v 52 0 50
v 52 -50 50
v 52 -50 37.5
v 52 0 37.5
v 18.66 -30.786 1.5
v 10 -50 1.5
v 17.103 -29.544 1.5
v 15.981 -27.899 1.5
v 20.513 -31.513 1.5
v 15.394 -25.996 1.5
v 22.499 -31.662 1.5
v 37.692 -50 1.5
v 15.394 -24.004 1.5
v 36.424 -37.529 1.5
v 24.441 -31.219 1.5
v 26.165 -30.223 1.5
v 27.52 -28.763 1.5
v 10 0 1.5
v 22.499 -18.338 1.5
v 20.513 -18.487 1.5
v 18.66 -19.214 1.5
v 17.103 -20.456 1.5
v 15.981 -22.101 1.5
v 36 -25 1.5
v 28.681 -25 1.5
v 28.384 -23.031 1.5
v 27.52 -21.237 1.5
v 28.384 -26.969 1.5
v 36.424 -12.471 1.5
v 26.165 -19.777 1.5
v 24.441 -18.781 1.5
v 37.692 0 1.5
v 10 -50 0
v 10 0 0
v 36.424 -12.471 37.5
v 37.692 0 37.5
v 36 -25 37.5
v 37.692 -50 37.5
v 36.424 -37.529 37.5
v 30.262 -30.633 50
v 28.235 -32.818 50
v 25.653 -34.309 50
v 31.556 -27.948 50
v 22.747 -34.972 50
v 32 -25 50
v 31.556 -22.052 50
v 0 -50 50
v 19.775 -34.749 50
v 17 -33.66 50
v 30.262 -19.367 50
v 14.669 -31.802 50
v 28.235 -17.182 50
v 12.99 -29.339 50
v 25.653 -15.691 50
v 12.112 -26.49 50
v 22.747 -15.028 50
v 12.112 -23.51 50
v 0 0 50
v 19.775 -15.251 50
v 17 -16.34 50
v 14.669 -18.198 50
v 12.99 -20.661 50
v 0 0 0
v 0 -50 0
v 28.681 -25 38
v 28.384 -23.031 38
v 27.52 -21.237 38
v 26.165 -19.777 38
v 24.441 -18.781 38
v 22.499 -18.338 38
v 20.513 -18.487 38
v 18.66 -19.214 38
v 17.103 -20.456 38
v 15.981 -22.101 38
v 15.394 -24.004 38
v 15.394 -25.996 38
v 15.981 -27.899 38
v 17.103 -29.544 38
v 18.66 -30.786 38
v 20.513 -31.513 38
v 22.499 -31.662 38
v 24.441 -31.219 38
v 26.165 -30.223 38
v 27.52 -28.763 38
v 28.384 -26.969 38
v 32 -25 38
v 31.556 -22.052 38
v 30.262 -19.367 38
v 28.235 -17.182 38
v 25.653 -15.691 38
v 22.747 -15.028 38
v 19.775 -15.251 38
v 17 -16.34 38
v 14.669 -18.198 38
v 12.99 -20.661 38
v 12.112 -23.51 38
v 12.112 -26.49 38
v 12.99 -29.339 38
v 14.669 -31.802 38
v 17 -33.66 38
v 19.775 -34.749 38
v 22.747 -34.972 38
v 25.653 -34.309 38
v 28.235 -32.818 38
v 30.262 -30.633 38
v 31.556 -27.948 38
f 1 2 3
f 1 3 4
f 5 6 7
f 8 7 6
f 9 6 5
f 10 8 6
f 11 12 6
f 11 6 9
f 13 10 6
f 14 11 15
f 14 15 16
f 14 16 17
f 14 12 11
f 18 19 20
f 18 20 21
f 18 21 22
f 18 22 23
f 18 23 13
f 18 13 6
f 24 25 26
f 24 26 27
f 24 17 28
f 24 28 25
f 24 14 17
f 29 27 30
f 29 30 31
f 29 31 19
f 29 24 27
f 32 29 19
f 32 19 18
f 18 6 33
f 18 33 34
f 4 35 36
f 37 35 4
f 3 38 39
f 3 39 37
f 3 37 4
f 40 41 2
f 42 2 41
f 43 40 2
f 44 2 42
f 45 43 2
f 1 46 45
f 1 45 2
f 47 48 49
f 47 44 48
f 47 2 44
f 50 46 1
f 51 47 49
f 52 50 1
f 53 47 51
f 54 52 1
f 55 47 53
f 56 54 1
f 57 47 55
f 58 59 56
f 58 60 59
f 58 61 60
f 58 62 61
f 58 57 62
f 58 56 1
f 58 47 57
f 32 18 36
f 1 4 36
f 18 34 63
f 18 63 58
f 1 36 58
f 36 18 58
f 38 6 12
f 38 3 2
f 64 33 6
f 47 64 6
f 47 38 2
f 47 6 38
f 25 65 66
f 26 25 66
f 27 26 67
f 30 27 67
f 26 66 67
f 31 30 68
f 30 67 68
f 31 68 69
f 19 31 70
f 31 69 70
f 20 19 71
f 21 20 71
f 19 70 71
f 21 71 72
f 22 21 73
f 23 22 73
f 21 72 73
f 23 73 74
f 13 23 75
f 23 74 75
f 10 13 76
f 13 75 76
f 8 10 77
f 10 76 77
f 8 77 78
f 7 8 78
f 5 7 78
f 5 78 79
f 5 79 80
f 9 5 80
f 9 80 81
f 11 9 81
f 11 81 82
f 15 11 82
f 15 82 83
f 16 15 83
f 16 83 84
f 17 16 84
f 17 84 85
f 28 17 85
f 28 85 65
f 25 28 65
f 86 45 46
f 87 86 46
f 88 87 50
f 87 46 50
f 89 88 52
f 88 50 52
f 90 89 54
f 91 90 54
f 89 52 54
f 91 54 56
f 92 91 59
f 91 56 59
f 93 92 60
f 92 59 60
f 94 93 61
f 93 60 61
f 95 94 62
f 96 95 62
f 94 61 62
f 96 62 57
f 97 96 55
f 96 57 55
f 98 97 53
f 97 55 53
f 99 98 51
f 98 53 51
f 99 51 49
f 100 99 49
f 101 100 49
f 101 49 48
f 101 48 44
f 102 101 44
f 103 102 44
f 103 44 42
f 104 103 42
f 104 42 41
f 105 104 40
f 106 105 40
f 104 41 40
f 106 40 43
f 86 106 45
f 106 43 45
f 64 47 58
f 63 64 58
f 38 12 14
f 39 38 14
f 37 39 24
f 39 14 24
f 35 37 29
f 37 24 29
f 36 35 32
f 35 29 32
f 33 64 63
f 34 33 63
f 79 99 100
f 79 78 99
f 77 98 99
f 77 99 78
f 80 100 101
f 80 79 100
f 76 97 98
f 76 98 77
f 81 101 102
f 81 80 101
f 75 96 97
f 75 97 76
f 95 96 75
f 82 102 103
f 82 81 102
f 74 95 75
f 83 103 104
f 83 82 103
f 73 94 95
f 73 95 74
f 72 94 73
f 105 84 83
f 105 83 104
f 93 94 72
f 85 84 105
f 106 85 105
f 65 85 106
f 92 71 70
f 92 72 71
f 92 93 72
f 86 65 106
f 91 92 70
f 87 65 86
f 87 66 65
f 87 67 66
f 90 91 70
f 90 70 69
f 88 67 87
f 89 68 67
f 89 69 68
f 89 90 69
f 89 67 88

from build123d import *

# Parameters (mm, degrees)
F0_W     = 50
F0_H     = 50
F1_DEPTH = 52
F2_W     = 50
F2_H     = 1.5
F3_DEPTH = 42
F5_DEPTH = 36
F6_R     = 6.680851
F7_DEPTH = 65.6
F8_R     = 10
F9_DEPTH = 12


with BuildPart() as f1:
    # F0 (on Right) → F1 (new body)
    with BuildSketch(Plane.YZ):
        with Locations((-25, 25)):
            Rectangle(F0_W, F0_H)
    extrude(amount=F1_DEPTH)

    # F2 (on face) → F3 (cut)
    with BuildSketch(Plane.YZ.offset(52)):
        with Locations((-25, 0.75)):
            Rectangle(F2_W, F2_H)
    extrude(amount=-F3_DEPTH, mode=Mode.SUBTRACT)

    # F4 (on face) → F5 (cut)
    with BuildSketch(Plane(origin=(0, 0, 1.5), x_dir=(1, 0, 0), z_dir=(0, 0, -1))):
        with BuildLine():
            Line((68.967977, -80.566245), (77.262936, 141.644415))
            ThreePointArc((77.262936, 141.644415), (36.12911, 31.919758), (68.967977, -80.566245))
        make_face()
    extrude(amount=-F5_DEPTH, mode=Mode.SUBTRACT)

    # F6 (on face) → F7 (cut)
    with BuildSketch(Plane.XY.offset(50)):
        with Locations((22, -25)):
            Circle(F6_R)
    extrude(amount=-F7_DEPTH, mode=Mode.SUBTRACT)

    # F8 (on face) → F9 (cut)
    with BuildSketch(Plane.XY.offset(50)):
        with Locations((22, -25)):
            Circle(F8_R)
    extrude(amount=-F9_DEPTH, mode=Mode.SUBTRACT)


solid = f1.part
